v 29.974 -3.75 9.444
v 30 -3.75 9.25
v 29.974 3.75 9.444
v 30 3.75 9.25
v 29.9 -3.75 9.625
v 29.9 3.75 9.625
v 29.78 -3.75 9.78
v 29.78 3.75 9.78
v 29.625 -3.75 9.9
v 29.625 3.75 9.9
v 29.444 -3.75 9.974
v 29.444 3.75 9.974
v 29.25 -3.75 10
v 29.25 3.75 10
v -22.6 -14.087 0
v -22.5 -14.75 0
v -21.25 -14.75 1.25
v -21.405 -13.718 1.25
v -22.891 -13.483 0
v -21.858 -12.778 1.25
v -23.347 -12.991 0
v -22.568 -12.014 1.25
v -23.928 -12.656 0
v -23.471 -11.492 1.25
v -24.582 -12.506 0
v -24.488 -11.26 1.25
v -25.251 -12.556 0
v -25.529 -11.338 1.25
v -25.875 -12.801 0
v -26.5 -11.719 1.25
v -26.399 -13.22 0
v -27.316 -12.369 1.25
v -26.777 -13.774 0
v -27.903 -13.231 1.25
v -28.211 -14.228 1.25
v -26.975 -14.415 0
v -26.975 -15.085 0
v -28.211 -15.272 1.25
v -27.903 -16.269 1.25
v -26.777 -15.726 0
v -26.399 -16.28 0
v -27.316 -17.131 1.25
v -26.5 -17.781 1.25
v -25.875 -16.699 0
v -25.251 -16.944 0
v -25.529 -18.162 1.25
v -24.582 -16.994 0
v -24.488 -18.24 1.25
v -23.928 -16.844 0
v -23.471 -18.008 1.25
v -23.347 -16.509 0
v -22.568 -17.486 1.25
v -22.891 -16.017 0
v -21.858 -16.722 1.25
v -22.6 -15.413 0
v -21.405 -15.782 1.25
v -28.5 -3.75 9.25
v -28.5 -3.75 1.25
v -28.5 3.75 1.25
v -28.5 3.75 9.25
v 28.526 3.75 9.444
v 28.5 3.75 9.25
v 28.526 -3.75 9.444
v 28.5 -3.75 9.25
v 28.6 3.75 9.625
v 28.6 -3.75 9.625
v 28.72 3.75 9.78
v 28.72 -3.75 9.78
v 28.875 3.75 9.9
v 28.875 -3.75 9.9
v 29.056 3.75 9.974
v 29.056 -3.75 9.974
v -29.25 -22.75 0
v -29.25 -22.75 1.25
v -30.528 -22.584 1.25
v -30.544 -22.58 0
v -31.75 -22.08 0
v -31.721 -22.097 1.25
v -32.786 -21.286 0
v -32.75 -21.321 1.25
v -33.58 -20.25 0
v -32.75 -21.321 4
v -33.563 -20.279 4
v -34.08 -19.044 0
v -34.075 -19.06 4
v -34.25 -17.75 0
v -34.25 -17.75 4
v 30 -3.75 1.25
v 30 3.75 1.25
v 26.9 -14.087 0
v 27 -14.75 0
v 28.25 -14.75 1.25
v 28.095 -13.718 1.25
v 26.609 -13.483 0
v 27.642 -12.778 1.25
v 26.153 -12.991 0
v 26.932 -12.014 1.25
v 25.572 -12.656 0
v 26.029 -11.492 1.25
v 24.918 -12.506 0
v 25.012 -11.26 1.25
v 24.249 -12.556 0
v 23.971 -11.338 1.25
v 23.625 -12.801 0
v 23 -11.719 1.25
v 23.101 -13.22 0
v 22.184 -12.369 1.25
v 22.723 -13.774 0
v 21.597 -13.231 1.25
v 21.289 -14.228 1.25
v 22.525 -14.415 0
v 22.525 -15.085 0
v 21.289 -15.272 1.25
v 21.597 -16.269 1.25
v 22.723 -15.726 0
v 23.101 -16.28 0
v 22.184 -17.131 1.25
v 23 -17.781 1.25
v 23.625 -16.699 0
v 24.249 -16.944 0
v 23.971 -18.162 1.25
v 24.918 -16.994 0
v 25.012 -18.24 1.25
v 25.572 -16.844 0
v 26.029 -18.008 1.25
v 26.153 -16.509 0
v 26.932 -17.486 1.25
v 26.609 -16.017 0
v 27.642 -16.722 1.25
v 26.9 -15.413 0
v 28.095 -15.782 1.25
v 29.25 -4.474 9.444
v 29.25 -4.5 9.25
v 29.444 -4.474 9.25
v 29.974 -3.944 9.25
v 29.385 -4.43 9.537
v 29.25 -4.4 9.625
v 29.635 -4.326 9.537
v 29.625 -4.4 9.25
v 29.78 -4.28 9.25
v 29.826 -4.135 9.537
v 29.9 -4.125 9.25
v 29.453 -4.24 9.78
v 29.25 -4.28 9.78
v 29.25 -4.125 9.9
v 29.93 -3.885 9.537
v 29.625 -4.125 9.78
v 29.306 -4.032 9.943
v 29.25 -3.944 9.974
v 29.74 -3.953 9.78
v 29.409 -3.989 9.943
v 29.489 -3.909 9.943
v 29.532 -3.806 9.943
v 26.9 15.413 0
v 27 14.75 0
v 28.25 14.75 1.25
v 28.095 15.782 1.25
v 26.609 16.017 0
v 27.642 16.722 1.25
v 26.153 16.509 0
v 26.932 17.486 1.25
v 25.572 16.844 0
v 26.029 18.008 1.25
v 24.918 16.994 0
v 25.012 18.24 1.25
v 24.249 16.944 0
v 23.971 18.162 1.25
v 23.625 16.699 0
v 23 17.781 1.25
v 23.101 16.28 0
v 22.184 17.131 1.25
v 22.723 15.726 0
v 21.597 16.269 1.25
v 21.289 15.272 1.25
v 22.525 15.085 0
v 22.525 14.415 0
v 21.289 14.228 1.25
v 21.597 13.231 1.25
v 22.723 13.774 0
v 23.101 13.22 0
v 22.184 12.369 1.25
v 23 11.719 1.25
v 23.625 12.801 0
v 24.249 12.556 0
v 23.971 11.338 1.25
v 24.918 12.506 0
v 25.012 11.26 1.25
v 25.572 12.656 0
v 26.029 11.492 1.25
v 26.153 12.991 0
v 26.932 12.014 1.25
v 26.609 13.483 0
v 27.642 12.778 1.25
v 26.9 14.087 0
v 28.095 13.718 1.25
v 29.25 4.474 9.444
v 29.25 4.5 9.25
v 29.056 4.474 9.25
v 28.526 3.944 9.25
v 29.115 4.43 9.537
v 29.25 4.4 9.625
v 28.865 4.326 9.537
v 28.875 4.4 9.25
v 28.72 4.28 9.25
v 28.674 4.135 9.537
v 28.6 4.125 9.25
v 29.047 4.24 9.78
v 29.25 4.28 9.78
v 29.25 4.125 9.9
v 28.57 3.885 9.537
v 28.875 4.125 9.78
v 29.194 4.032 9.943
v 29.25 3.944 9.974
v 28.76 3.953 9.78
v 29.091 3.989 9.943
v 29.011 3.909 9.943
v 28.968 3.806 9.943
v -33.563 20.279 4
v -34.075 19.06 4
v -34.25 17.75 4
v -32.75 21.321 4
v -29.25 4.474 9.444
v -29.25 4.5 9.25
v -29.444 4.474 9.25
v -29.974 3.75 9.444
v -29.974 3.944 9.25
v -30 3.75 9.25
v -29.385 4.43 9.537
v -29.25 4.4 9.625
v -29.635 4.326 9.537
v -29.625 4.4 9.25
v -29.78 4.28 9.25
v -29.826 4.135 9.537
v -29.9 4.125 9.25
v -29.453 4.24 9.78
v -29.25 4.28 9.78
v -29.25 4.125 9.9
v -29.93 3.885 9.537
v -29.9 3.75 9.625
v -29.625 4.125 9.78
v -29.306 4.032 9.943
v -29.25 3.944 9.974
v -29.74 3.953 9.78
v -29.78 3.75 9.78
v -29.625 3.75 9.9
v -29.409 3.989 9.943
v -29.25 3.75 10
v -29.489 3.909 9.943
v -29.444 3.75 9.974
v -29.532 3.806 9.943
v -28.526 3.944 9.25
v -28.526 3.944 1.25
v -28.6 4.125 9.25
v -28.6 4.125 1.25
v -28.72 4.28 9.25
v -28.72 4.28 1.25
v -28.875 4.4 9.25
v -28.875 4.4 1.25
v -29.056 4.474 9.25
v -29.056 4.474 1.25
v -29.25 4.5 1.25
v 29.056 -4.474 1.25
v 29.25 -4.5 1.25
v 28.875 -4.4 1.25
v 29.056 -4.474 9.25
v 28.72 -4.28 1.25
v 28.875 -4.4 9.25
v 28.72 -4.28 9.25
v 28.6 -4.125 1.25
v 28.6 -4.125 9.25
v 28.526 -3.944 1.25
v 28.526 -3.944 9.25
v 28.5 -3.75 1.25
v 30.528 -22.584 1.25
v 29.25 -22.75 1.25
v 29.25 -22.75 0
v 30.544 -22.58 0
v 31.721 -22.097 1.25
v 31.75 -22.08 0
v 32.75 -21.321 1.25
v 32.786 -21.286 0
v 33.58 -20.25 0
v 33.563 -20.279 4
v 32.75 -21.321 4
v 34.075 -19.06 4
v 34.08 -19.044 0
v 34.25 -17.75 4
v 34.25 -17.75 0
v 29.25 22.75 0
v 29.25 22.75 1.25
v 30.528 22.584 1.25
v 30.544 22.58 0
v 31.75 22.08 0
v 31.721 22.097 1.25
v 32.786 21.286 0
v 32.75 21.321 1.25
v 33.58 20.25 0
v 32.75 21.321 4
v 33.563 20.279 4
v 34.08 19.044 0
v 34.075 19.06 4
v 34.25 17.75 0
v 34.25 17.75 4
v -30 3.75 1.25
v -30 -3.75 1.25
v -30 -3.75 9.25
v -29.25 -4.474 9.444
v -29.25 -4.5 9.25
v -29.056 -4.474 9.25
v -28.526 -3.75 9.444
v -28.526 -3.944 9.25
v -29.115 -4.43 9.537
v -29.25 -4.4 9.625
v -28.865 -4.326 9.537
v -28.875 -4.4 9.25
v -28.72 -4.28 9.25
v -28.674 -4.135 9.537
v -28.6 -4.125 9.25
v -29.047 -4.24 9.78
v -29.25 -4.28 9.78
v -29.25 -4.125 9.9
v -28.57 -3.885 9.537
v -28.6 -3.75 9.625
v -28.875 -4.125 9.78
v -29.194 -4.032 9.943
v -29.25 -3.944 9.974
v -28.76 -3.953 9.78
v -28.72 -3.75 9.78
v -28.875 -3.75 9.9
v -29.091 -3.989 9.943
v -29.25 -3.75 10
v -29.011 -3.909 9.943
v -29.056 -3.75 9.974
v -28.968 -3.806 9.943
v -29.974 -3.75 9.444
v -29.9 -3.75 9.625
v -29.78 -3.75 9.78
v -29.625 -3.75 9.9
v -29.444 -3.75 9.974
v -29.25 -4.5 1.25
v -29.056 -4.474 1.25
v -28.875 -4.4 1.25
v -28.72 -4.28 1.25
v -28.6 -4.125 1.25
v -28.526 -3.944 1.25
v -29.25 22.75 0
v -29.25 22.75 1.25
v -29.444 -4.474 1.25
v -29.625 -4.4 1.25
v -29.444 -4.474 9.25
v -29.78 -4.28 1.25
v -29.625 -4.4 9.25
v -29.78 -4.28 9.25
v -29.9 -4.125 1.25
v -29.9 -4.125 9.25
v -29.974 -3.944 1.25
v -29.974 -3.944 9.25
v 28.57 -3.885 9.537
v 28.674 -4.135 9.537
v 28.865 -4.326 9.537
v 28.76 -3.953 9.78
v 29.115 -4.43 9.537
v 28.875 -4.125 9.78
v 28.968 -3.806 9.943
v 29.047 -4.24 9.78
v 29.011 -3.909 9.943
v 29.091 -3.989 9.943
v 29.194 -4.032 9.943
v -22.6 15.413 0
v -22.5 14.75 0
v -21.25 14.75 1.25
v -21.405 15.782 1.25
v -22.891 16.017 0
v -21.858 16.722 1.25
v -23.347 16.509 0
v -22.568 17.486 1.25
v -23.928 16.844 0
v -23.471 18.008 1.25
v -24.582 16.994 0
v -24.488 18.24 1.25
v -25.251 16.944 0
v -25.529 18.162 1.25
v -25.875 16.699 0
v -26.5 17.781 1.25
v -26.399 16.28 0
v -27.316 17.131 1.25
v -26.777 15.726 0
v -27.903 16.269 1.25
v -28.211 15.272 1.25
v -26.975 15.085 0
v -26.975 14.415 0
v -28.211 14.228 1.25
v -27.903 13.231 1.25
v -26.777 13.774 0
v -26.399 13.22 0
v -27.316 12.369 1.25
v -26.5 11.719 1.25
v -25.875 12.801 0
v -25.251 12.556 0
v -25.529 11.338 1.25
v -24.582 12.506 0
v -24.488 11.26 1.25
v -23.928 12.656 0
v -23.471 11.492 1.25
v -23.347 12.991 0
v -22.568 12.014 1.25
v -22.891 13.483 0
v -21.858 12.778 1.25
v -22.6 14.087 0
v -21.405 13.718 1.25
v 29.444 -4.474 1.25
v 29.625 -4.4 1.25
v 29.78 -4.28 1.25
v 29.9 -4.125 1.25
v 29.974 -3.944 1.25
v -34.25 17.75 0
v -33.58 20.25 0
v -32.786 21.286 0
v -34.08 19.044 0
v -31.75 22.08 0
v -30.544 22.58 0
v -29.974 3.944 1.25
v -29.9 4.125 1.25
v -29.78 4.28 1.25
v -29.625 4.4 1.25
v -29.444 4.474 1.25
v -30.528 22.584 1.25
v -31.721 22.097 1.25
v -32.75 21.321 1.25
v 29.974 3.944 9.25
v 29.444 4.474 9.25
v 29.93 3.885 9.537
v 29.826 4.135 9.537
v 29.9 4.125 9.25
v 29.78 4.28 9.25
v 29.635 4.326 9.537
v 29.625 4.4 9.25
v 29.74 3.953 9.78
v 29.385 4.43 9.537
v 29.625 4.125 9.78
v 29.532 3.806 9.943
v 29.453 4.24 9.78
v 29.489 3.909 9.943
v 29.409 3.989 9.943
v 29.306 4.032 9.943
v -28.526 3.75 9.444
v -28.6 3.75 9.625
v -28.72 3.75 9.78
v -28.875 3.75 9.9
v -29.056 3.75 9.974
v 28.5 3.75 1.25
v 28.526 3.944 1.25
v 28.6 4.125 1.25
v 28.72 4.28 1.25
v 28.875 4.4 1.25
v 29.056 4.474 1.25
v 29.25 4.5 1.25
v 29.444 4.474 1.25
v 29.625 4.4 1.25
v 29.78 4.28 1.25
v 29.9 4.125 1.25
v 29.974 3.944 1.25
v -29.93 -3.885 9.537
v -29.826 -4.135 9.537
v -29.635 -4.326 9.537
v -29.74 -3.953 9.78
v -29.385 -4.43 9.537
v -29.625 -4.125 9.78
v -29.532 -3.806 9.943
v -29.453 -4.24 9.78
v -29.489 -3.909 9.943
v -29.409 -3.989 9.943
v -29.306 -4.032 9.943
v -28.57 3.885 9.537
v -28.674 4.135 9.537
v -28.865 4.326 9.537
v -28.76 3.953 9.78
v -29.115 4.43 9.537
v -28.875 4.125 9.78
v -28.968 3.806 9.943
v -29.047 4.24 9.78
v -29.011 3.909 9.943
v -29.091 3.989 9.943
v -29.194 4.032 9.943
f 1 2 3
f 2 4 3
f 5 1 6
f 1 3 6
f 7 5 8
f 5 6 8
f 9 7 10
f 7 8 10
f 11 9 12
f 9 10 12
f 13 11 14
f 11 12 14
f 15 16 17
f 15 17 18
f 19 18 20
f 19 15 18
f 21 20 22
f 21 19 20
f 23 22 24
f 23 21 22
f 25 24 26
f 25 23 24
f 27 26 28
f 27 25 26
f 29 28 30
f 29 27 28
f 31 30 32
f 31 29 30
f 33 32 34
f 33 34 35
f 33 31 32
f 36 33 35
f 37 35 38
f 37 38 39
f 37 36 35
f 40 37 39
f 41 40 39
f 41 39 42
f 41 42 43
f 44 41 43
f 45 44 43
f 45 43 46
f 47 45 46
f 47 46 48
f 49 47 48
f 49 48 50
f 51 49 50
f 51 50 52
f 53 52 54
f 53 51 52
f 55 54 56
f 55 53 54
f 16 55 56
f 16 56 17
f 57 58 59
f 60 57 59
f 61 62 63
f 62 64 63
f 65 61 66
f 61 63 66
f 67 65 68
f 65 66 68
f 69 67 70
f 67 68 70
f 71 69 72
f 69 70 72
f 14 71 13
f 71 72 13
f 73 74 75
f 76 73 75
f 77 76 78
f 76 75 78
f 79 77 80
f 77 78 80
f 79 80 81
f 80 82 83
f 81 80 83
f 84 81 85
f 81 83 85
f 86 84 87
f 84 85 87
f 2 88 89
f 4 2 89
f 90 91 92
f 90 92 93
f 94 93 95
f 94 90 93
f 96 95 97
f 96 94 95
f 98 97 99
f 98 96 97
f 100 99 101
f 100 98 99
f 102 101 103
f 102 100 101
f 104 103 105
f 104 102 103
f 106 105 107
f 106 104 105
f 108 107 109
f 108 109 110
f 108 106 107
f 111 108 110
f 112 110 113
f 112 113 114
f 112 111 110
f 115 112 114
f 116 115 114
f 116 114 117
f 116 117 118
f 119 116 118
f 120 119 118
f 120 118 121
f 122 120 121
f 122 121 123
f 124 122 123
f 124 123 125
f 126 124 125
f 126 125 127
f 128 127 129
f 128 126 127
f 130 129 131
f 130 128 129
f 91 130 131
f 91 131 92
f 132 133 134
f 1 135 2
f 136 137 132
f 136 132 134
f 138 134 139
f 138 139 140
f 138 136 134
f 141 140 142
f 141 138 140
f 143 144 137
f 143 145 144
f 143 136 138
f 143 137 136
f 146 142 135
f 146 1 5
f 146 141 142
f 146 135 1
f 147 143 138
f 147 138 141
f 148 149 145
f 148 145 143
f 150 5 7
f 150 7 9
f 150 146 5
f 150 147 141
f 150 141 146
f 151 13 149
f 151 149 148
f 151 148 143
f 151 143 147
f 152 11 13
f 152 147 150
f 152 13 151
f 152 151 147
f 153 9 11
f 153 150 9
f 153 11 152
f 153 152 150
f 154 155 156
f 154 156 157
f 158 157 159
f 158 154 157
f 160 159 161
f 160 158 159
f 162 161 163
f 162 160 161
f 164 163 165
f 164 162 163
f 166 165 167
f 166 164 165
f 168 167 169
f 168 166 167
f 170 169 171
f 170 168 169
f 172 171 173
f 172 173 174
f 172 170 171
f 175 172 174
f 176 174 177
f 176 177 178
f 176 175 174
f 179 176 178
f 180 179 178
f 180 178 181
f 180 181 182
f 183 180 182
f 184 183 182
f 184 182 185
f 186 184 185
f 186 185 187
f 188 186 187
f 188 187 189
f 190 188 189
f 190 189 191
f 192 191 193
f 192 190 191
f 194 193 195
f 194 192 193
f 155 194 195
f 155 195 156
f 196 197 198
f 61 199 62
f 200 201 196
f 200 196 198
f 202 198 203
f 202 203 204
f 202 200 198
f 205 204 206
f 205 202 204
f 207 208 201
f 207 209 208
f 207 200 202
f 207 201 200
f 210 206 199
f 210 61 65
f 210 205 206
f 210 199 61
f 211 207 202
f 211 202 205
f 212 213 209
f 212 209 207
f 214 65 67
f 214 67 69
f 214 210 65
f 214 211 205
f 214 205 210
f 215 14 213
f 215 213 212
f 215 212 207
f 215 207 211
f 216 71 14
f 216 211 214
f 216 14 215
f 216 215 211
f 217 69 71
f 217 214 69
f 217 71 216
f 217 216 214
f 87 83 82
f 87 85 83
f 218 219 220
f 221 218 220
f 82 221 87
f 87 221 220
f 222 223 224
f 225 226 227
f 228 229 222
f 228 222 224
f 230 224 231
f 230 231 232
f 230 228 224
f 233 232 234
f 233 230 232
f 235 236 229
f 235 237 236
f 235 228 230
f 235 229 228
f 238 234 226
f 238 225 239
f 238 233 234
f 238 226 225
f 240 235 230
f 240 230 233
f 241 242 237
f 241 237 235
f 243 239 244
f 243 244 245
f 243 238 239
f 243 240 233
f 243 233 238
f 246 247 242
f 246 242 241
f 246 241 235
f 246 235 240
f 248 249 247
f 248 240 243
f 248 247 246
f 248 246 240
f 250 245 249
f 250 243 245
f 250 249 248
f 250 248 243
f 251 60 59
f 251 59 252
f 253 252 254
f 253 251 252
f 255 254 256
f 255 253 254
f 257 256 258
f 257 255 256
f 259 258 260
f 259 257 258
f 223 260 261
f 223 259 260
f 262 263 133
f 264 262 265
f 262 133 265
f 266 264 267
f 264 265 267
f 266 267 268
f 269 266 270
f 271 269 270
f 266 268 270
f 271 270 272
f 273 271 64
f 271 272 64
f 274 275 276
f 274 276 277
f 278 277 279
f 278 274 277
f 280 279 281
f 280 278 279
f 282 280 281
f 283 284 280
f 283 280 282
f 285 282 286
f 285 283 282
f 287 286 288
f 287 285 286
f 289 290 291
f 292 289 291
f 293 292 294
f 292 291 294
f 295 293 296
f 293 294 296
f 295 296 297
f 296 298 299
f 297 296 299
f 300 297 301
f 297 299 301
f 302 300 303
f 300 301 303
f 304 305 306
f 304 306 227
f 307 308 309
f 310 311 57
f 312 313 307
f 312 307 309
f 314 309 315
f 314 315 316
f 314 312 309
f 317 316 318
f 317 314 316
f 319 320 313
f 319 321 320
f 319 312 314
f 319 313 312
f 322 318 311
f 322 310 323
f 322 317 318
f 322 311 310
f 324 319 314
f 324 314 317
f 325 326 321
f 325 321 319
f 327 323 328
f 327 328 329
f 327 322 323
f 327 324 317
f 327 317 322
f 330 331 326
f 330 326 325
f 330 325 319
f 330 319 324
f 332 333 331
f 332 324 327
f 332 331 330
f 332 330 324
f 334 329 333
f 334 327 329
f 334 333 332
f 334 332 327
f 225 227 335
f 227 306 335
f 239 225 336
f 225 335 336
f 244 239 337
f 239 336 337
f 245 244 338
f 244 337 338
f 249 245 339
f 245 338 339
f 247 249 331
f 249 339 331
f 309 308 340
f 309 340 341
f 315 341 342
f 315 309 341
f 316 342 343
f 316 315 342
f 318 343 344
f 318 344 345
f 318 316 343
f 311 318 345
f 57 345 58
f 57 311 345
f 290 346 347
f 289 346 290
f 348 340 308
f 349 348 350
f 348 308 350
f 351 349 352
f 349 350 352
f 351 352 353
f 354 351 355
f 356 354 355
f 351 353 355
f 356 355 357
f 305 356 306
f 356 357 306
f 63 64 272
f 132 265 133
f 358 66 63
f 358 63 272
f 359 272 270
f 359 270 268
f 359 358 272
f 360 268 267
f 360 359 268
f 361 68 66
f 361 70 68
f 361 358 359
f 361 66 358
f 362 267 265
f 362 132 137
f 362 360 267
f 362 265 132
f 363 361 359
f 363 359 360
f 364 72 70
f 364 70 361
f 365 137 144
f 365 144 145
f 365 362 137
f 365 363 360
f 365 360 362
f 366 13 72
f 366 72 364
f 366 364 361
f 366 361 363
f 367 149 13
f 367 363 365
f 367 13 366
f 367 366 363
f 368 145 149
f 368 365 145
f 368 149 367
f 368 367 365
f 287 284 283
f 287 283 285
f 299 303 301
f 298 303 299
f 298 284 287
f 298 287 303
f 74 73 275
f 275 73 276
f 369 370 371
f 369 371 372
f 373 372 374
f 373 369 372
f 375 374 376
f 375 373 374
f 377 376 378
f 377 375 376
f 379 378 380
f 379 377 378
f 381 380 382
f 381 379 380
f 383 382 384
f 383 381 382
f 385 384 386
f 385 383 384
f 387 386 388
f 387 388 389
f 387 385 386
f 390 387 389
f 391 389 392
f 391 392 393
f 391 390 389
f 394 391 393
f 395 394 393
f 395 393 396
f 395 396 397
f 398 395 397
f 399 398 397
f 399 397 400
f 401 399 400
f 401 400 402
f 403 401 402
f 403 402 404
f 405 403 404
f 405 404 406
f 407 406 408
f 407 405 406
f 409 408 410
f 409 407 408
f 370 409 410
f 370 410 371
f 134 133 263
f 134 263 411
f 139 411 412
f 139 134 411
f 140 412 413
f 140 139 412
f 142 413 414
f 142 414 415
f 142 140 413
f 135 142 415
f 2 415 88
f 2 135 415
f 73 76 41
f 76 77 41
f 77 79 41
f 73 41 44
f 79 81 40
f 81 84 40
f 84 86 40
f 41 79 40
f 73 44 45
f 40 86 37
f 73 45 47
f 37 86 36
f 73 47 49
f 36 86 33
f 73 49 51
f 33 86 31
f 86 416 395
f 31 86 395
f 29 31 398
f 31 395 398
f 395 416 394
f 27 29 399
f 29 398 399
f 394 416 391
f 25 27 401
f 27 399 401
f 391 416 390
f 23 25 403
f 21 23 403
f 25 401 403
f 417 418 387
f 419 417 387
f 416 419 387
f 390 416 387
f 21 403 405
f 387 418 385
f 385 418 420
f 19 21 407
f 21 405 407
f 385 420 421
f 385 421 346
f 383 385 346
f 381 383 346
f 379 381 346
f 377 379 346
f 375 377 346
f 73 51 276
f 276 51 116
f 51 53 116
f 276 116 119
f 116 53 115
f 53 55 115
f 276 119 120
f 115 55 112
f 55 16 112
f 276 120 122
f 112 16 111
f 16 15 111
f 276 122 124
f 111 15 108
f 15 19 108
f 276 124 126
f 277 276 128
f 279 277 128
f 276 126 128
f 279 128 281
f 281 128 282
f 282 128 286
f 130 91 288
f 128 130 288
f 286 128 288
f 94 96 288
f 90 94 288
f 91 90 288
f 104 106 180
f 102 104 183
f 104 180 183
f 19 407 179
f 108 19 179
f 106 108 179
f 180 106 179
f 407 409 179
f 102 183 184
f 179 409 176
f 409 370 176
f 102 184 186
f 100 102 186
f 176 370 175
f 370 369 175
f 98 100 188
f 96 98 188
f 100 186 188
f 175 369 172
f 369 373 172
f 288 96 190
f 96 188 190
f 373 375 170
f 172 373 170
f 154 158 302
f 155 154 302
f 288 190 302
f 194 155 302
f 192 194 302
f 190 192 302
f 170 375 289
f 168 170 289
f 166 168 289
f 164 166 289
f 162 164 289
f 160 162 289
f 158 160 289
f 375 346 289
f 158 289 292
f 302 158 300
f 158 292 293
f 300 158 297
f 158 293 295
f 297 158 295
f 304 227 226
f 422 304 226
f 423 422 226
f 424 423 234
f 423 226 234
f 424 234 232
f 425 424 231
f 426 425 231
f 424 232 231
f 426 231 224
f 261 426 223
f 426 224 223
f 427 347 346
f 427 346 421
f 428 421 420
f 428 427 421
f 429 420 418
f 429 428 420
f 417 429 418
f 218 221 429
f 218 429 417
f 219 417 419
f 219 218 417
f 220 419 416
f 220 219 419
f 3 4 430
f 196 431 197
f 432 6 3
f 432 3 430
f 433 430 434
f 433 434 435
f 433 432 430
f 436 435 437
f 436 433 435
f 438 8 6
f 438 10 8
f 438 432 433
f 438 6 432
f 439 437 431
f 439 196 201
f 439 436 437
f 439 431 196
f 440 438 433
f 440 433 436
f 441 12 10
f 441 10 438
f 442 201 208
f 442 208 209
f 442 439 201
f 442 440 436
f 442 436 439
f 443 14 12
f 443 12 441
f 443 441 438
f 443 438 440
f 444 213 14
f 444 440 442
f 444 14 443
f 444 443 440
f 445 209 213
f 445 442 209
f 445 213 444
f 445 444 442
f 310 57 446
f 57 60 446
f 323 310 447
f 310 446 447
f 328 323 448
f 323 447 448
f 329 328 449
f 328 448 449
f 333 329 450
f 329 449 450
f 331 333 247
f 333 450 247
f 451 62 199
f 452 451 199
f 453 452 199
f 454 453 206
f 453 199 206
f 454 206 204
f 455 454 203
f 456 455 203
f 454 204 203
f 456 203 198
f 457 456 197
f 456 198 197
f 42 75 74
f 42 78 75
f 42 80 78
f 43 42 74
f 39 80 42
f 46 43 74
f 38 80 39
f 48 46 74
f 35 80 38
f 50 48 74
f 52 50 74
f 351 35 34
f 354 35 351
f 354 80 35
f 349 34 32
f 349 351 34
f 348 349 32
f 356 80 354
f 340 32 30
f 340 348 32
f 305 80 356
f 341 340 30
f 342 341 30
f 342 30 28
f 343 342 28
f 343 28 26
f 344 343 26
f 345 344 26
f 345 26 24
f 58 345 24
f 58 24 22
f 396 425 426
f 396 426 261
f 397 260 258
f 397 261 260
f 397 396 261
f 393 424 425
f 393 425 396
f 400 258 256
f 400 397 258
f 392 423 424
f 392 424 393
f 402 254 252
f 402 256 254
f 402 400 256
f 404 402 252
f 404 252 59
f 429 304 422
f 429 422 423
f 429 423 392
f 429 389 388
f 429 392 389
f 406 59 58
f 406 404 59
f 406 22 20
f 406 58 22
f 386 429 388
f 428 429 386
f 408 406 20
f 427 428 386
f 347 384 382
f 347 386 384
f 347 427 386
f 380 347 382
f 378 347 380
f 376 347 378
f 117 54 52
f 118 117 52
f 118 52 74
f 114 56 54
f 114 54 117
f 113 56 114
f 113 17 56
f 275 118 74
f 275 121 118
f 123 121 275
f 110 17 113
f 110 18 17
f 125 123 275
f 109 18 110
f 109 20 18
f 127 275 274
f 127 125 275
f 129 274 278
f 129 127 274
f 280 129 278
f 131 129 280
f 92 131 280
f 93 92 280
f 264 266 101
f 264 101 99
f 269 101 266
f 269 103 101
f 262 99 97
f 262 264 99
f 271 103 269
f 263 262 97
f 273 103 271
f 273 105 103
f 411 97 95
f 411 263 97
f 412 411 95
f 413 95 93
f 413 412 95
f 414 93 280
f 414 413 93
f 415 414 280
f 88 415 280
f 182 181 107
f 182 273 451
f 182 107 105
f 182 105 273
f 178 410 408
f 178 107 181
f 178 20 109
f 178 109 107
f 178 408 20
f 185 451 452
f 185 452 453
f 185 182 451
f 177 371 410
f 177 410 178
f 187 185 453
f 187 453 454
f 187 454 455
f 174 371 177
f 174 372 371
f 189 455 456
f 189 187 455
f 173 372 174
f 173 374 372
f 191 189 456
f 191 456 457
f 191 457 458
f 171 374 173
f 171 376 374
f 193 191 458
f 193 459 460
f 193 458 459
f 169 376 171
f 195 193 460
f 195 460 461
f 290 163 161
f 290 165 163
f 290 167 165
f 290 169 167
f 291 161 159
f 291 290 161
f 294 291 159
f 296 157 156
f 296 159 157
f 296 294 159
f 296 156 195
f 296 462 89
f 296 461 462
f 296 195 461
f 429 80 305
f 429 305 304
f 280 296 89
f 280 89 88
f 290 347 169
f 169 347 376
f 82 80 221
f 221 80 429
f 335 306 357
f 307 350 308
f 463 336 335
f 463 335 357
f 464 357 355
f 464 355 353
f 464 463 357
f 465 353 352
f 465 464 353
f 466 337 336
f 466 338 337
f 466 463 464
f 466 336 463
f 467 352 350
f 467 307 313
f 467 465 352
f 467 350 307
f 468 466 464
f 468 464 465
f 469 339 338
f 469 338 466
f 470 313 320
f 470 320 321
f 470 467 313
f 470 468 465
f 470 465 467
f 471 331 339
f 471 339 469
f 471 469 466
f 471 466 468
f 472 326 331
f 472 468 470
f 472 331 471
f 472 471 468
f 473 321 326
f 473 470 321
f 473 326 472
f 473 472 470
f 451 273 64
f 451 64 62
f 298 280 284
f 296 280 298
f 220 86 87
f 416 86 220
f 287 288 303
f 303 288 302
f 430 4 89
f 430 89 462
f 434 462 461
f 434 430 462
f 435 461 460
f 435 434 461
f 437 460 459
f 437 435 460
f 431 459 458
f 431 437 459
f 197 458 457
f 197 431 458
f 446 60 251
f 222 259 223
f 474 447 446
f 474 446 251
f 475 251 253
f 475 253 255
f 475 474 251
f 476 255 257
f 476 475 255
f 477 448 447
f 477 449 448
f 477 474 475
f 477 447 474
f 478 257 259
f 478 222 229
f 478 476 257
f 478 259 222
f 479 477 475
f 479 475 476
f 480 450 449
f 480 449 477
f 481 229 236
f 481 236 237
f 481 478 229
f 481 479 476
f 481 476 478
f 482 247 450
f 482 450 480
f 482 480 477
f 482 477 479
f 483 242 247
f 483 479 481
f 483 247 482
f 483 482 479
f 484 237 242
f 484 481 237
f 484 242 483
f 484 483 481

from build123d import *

# Parameters (mm, degrees)
F0_W     = 65.5
F0_H     = 45.5
F0_R     = 1.5
F0_W_2   = 1.5
F0_H_2   = 9
F1_DEPTH = 1.25
F2_DEPTH = 10
F3_DEPTH = 4
F5_R     = 0.74999
F6_R     = 0.74999
F7_R     = 5


# Not quite as in the source:
# - a fillet or chamfer that OpenCascade refuses, or shapes differently, is made with other operations: its cross-section is extruded or revolved along the edge and cut away or added
# - a fillet or chamfer is up to 0.001 mm smaller than in the source, because OpenCascade refuses the exact size


with BuildPart() as f1:
    # F0 (on Top) → F1 (new body)
    with BuildSketch(Plane.XY):
        Rectangle(F0_W, F0_H)
        with Locations((-24.75, -14.75)):
            Circle(F0_R, mode=Mode.SUBTRACT)
        with Locations((24.75, -14.75)):
            Circle(F0_R, mode=Mode.SUBTRACT)
        with Locations((-29.25, 0)):
            Rectangle(F0_W_2, F0_H_2, mode=Mode.SUBTRACT)
        with Locations((-24.75, 14.75)):
            Circle(F0_R, mode=Mode.SUBTRACT)
        with Locations((29.25, 0)):
            Rectangle(F0_W_2, F0_H_2, mode=Mode.SUBTRACT)
        with Locations((24.75, 14.75)):
            Circle(F0_R, mode=Mode.SUBTRACT)
    extrude(amount=F1_DEPTH)

    # F0 (on Top) → F2 (join)
    with BuildSketch(Plane.XY):
        with Locations((-29.25, 0)):
            Rectangle(F0_W_2, F0_H_2)
        with Locations((29.25, 0)):
            Rectangle(F0_W_2, F0_H_2)
    extrude(amount=F2_DEPTH)

    # F0 (on Top) → F3 (join)
    with BuildSketch(Plane.XY):
        with Locations((-33.5, 0)):
            Rectangle(F0_W_2, F0_H)
        with Locations((33.5, 0)):
            Rectangle(F0_W_2, F0_H)
    extrude(amount=F3_DEPTH)

    # F4: chamfer of 2 on 4 edges, made by hand

    # F4_s1 → F4_t2 (revolve, cut)
    with BuildSketch(Plane.XZ.offset(-14.75)):
        Polygon((-21.25, 1.25), (-23.25, -0.75), (-23.25, 1.25), align=None)
    revolve(axis=Axis((-24.75, 14.75, 1.25), (0, 0, 1)), mode=Mode.SUBTRACT)

    # F4_s3 → F4_t4 (revolve, cut)
    with BuildSketch(Plane.XZ.offset(14.75)):
        Polygon((-21.25, 1.25), (-23.25, -0.75), (-23.25, 1.25), align=None)
    revolve(axis=Axis((-24.75, -14.75, 1.25), (0, 0, 1)), mode=Mode.SUBTRACT)

    # F4_s5 → F4_t6 (revolve, cut)
    with BuildSketch(Plane.XZ.offset(-14.75)):
        Polygon((28.25, 1.25), (26.25, -0.75), (26.25, 1.25), align=None)
    revolve(axis=Axis((24.75, 14.75, 1.25), (0, 0, 1)), mode=Mode.SUBTRACT)

    # F4_s7 → F4_t8 (revolve, cut)
    with BuildSketch(Plane.XZ.offset(14.75)):
        Polygon((28.25, 1.25), (26.25, -0.75), (26.25, 1.25), align=None)
    revolve(axis=Axis((24.75, -14.75, 1.25), (0, 0, 1)), mode=Mode.SUBTRACT)

    # F5 (radius 0.75 in the source; OpenCascade refuses exactly that, so slightly less here)
    f5_edges = [f1.edges().sort_by_distance(p)[0] for p in [
        (-30, 4.5, 5.625),
        (30, 4.5, 5.625),
        (28.5, 4.5, 5.625),
        (-30, -4.5, 5.625),
        (-28.5, -4.5, 5.625),
        (28.5, -4.5, 5.625),
        (30, -4.5, 5.625),
        (-28.5, 4.5, 5.625),
    ]]
    fillet(f5_edges, radius=F5_R)

    # F6 (radius 0.75 in the source; OpenCascade refuses exactly that, so slightly less here)
    f6_edges = [f1.edges().sort_by_distance(p)[0] for p in [
        (-29.25, -4.5, 10),
        (-29.780333, -4.280333, 10),
        (-28.719667, -4.280333, 10),
        (-30, 0, 10),
        (-28.5, 0, 10),
        (-29.780333, 4.280333, 10),
        (-28.719667, 4.280333, 10),
        (-29.25, 4.5, 10),
        (29.25, -4.5, 10),
        (28.719667, -4.280333, 10),
        (29.780333, -4.280333, 10),
        (28.5, 0, 10),
        (30, 0, 10),
        (28.719667, 4.280333, 10),
        (29.780333, 4.280333, 10),
        (29.25, 4.5, 10),
    ]]
    fillet(f6_edges, radius=F6_R)

    # F7
    f7_edges = [f1.edges().sort_by_distance(p)[0] for p in [
        (-34.25, -22.75, 2),
        (34.25, -22.75, 2),
        (34.25, 22.75, 2),
        (-34.25, 22.75, 2),
    ]]
    fillet(f7_edges, radius=F7_R)


solid = f1.part
